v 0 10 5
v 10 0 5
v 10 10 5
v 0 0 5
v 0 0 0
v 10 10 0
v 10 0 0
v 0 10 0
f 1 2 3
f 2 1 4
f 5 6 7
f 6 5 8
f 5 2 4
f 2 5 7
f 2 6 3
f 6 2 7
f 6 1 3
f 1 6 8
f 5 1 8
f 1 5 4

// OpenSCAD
a=5;
/* [Group 1] */
a=10;
b=10;
/* [Group 2] */
a=20;
c=5;
/* [Group 3] */
a=10;

cube([a,b,c]);
